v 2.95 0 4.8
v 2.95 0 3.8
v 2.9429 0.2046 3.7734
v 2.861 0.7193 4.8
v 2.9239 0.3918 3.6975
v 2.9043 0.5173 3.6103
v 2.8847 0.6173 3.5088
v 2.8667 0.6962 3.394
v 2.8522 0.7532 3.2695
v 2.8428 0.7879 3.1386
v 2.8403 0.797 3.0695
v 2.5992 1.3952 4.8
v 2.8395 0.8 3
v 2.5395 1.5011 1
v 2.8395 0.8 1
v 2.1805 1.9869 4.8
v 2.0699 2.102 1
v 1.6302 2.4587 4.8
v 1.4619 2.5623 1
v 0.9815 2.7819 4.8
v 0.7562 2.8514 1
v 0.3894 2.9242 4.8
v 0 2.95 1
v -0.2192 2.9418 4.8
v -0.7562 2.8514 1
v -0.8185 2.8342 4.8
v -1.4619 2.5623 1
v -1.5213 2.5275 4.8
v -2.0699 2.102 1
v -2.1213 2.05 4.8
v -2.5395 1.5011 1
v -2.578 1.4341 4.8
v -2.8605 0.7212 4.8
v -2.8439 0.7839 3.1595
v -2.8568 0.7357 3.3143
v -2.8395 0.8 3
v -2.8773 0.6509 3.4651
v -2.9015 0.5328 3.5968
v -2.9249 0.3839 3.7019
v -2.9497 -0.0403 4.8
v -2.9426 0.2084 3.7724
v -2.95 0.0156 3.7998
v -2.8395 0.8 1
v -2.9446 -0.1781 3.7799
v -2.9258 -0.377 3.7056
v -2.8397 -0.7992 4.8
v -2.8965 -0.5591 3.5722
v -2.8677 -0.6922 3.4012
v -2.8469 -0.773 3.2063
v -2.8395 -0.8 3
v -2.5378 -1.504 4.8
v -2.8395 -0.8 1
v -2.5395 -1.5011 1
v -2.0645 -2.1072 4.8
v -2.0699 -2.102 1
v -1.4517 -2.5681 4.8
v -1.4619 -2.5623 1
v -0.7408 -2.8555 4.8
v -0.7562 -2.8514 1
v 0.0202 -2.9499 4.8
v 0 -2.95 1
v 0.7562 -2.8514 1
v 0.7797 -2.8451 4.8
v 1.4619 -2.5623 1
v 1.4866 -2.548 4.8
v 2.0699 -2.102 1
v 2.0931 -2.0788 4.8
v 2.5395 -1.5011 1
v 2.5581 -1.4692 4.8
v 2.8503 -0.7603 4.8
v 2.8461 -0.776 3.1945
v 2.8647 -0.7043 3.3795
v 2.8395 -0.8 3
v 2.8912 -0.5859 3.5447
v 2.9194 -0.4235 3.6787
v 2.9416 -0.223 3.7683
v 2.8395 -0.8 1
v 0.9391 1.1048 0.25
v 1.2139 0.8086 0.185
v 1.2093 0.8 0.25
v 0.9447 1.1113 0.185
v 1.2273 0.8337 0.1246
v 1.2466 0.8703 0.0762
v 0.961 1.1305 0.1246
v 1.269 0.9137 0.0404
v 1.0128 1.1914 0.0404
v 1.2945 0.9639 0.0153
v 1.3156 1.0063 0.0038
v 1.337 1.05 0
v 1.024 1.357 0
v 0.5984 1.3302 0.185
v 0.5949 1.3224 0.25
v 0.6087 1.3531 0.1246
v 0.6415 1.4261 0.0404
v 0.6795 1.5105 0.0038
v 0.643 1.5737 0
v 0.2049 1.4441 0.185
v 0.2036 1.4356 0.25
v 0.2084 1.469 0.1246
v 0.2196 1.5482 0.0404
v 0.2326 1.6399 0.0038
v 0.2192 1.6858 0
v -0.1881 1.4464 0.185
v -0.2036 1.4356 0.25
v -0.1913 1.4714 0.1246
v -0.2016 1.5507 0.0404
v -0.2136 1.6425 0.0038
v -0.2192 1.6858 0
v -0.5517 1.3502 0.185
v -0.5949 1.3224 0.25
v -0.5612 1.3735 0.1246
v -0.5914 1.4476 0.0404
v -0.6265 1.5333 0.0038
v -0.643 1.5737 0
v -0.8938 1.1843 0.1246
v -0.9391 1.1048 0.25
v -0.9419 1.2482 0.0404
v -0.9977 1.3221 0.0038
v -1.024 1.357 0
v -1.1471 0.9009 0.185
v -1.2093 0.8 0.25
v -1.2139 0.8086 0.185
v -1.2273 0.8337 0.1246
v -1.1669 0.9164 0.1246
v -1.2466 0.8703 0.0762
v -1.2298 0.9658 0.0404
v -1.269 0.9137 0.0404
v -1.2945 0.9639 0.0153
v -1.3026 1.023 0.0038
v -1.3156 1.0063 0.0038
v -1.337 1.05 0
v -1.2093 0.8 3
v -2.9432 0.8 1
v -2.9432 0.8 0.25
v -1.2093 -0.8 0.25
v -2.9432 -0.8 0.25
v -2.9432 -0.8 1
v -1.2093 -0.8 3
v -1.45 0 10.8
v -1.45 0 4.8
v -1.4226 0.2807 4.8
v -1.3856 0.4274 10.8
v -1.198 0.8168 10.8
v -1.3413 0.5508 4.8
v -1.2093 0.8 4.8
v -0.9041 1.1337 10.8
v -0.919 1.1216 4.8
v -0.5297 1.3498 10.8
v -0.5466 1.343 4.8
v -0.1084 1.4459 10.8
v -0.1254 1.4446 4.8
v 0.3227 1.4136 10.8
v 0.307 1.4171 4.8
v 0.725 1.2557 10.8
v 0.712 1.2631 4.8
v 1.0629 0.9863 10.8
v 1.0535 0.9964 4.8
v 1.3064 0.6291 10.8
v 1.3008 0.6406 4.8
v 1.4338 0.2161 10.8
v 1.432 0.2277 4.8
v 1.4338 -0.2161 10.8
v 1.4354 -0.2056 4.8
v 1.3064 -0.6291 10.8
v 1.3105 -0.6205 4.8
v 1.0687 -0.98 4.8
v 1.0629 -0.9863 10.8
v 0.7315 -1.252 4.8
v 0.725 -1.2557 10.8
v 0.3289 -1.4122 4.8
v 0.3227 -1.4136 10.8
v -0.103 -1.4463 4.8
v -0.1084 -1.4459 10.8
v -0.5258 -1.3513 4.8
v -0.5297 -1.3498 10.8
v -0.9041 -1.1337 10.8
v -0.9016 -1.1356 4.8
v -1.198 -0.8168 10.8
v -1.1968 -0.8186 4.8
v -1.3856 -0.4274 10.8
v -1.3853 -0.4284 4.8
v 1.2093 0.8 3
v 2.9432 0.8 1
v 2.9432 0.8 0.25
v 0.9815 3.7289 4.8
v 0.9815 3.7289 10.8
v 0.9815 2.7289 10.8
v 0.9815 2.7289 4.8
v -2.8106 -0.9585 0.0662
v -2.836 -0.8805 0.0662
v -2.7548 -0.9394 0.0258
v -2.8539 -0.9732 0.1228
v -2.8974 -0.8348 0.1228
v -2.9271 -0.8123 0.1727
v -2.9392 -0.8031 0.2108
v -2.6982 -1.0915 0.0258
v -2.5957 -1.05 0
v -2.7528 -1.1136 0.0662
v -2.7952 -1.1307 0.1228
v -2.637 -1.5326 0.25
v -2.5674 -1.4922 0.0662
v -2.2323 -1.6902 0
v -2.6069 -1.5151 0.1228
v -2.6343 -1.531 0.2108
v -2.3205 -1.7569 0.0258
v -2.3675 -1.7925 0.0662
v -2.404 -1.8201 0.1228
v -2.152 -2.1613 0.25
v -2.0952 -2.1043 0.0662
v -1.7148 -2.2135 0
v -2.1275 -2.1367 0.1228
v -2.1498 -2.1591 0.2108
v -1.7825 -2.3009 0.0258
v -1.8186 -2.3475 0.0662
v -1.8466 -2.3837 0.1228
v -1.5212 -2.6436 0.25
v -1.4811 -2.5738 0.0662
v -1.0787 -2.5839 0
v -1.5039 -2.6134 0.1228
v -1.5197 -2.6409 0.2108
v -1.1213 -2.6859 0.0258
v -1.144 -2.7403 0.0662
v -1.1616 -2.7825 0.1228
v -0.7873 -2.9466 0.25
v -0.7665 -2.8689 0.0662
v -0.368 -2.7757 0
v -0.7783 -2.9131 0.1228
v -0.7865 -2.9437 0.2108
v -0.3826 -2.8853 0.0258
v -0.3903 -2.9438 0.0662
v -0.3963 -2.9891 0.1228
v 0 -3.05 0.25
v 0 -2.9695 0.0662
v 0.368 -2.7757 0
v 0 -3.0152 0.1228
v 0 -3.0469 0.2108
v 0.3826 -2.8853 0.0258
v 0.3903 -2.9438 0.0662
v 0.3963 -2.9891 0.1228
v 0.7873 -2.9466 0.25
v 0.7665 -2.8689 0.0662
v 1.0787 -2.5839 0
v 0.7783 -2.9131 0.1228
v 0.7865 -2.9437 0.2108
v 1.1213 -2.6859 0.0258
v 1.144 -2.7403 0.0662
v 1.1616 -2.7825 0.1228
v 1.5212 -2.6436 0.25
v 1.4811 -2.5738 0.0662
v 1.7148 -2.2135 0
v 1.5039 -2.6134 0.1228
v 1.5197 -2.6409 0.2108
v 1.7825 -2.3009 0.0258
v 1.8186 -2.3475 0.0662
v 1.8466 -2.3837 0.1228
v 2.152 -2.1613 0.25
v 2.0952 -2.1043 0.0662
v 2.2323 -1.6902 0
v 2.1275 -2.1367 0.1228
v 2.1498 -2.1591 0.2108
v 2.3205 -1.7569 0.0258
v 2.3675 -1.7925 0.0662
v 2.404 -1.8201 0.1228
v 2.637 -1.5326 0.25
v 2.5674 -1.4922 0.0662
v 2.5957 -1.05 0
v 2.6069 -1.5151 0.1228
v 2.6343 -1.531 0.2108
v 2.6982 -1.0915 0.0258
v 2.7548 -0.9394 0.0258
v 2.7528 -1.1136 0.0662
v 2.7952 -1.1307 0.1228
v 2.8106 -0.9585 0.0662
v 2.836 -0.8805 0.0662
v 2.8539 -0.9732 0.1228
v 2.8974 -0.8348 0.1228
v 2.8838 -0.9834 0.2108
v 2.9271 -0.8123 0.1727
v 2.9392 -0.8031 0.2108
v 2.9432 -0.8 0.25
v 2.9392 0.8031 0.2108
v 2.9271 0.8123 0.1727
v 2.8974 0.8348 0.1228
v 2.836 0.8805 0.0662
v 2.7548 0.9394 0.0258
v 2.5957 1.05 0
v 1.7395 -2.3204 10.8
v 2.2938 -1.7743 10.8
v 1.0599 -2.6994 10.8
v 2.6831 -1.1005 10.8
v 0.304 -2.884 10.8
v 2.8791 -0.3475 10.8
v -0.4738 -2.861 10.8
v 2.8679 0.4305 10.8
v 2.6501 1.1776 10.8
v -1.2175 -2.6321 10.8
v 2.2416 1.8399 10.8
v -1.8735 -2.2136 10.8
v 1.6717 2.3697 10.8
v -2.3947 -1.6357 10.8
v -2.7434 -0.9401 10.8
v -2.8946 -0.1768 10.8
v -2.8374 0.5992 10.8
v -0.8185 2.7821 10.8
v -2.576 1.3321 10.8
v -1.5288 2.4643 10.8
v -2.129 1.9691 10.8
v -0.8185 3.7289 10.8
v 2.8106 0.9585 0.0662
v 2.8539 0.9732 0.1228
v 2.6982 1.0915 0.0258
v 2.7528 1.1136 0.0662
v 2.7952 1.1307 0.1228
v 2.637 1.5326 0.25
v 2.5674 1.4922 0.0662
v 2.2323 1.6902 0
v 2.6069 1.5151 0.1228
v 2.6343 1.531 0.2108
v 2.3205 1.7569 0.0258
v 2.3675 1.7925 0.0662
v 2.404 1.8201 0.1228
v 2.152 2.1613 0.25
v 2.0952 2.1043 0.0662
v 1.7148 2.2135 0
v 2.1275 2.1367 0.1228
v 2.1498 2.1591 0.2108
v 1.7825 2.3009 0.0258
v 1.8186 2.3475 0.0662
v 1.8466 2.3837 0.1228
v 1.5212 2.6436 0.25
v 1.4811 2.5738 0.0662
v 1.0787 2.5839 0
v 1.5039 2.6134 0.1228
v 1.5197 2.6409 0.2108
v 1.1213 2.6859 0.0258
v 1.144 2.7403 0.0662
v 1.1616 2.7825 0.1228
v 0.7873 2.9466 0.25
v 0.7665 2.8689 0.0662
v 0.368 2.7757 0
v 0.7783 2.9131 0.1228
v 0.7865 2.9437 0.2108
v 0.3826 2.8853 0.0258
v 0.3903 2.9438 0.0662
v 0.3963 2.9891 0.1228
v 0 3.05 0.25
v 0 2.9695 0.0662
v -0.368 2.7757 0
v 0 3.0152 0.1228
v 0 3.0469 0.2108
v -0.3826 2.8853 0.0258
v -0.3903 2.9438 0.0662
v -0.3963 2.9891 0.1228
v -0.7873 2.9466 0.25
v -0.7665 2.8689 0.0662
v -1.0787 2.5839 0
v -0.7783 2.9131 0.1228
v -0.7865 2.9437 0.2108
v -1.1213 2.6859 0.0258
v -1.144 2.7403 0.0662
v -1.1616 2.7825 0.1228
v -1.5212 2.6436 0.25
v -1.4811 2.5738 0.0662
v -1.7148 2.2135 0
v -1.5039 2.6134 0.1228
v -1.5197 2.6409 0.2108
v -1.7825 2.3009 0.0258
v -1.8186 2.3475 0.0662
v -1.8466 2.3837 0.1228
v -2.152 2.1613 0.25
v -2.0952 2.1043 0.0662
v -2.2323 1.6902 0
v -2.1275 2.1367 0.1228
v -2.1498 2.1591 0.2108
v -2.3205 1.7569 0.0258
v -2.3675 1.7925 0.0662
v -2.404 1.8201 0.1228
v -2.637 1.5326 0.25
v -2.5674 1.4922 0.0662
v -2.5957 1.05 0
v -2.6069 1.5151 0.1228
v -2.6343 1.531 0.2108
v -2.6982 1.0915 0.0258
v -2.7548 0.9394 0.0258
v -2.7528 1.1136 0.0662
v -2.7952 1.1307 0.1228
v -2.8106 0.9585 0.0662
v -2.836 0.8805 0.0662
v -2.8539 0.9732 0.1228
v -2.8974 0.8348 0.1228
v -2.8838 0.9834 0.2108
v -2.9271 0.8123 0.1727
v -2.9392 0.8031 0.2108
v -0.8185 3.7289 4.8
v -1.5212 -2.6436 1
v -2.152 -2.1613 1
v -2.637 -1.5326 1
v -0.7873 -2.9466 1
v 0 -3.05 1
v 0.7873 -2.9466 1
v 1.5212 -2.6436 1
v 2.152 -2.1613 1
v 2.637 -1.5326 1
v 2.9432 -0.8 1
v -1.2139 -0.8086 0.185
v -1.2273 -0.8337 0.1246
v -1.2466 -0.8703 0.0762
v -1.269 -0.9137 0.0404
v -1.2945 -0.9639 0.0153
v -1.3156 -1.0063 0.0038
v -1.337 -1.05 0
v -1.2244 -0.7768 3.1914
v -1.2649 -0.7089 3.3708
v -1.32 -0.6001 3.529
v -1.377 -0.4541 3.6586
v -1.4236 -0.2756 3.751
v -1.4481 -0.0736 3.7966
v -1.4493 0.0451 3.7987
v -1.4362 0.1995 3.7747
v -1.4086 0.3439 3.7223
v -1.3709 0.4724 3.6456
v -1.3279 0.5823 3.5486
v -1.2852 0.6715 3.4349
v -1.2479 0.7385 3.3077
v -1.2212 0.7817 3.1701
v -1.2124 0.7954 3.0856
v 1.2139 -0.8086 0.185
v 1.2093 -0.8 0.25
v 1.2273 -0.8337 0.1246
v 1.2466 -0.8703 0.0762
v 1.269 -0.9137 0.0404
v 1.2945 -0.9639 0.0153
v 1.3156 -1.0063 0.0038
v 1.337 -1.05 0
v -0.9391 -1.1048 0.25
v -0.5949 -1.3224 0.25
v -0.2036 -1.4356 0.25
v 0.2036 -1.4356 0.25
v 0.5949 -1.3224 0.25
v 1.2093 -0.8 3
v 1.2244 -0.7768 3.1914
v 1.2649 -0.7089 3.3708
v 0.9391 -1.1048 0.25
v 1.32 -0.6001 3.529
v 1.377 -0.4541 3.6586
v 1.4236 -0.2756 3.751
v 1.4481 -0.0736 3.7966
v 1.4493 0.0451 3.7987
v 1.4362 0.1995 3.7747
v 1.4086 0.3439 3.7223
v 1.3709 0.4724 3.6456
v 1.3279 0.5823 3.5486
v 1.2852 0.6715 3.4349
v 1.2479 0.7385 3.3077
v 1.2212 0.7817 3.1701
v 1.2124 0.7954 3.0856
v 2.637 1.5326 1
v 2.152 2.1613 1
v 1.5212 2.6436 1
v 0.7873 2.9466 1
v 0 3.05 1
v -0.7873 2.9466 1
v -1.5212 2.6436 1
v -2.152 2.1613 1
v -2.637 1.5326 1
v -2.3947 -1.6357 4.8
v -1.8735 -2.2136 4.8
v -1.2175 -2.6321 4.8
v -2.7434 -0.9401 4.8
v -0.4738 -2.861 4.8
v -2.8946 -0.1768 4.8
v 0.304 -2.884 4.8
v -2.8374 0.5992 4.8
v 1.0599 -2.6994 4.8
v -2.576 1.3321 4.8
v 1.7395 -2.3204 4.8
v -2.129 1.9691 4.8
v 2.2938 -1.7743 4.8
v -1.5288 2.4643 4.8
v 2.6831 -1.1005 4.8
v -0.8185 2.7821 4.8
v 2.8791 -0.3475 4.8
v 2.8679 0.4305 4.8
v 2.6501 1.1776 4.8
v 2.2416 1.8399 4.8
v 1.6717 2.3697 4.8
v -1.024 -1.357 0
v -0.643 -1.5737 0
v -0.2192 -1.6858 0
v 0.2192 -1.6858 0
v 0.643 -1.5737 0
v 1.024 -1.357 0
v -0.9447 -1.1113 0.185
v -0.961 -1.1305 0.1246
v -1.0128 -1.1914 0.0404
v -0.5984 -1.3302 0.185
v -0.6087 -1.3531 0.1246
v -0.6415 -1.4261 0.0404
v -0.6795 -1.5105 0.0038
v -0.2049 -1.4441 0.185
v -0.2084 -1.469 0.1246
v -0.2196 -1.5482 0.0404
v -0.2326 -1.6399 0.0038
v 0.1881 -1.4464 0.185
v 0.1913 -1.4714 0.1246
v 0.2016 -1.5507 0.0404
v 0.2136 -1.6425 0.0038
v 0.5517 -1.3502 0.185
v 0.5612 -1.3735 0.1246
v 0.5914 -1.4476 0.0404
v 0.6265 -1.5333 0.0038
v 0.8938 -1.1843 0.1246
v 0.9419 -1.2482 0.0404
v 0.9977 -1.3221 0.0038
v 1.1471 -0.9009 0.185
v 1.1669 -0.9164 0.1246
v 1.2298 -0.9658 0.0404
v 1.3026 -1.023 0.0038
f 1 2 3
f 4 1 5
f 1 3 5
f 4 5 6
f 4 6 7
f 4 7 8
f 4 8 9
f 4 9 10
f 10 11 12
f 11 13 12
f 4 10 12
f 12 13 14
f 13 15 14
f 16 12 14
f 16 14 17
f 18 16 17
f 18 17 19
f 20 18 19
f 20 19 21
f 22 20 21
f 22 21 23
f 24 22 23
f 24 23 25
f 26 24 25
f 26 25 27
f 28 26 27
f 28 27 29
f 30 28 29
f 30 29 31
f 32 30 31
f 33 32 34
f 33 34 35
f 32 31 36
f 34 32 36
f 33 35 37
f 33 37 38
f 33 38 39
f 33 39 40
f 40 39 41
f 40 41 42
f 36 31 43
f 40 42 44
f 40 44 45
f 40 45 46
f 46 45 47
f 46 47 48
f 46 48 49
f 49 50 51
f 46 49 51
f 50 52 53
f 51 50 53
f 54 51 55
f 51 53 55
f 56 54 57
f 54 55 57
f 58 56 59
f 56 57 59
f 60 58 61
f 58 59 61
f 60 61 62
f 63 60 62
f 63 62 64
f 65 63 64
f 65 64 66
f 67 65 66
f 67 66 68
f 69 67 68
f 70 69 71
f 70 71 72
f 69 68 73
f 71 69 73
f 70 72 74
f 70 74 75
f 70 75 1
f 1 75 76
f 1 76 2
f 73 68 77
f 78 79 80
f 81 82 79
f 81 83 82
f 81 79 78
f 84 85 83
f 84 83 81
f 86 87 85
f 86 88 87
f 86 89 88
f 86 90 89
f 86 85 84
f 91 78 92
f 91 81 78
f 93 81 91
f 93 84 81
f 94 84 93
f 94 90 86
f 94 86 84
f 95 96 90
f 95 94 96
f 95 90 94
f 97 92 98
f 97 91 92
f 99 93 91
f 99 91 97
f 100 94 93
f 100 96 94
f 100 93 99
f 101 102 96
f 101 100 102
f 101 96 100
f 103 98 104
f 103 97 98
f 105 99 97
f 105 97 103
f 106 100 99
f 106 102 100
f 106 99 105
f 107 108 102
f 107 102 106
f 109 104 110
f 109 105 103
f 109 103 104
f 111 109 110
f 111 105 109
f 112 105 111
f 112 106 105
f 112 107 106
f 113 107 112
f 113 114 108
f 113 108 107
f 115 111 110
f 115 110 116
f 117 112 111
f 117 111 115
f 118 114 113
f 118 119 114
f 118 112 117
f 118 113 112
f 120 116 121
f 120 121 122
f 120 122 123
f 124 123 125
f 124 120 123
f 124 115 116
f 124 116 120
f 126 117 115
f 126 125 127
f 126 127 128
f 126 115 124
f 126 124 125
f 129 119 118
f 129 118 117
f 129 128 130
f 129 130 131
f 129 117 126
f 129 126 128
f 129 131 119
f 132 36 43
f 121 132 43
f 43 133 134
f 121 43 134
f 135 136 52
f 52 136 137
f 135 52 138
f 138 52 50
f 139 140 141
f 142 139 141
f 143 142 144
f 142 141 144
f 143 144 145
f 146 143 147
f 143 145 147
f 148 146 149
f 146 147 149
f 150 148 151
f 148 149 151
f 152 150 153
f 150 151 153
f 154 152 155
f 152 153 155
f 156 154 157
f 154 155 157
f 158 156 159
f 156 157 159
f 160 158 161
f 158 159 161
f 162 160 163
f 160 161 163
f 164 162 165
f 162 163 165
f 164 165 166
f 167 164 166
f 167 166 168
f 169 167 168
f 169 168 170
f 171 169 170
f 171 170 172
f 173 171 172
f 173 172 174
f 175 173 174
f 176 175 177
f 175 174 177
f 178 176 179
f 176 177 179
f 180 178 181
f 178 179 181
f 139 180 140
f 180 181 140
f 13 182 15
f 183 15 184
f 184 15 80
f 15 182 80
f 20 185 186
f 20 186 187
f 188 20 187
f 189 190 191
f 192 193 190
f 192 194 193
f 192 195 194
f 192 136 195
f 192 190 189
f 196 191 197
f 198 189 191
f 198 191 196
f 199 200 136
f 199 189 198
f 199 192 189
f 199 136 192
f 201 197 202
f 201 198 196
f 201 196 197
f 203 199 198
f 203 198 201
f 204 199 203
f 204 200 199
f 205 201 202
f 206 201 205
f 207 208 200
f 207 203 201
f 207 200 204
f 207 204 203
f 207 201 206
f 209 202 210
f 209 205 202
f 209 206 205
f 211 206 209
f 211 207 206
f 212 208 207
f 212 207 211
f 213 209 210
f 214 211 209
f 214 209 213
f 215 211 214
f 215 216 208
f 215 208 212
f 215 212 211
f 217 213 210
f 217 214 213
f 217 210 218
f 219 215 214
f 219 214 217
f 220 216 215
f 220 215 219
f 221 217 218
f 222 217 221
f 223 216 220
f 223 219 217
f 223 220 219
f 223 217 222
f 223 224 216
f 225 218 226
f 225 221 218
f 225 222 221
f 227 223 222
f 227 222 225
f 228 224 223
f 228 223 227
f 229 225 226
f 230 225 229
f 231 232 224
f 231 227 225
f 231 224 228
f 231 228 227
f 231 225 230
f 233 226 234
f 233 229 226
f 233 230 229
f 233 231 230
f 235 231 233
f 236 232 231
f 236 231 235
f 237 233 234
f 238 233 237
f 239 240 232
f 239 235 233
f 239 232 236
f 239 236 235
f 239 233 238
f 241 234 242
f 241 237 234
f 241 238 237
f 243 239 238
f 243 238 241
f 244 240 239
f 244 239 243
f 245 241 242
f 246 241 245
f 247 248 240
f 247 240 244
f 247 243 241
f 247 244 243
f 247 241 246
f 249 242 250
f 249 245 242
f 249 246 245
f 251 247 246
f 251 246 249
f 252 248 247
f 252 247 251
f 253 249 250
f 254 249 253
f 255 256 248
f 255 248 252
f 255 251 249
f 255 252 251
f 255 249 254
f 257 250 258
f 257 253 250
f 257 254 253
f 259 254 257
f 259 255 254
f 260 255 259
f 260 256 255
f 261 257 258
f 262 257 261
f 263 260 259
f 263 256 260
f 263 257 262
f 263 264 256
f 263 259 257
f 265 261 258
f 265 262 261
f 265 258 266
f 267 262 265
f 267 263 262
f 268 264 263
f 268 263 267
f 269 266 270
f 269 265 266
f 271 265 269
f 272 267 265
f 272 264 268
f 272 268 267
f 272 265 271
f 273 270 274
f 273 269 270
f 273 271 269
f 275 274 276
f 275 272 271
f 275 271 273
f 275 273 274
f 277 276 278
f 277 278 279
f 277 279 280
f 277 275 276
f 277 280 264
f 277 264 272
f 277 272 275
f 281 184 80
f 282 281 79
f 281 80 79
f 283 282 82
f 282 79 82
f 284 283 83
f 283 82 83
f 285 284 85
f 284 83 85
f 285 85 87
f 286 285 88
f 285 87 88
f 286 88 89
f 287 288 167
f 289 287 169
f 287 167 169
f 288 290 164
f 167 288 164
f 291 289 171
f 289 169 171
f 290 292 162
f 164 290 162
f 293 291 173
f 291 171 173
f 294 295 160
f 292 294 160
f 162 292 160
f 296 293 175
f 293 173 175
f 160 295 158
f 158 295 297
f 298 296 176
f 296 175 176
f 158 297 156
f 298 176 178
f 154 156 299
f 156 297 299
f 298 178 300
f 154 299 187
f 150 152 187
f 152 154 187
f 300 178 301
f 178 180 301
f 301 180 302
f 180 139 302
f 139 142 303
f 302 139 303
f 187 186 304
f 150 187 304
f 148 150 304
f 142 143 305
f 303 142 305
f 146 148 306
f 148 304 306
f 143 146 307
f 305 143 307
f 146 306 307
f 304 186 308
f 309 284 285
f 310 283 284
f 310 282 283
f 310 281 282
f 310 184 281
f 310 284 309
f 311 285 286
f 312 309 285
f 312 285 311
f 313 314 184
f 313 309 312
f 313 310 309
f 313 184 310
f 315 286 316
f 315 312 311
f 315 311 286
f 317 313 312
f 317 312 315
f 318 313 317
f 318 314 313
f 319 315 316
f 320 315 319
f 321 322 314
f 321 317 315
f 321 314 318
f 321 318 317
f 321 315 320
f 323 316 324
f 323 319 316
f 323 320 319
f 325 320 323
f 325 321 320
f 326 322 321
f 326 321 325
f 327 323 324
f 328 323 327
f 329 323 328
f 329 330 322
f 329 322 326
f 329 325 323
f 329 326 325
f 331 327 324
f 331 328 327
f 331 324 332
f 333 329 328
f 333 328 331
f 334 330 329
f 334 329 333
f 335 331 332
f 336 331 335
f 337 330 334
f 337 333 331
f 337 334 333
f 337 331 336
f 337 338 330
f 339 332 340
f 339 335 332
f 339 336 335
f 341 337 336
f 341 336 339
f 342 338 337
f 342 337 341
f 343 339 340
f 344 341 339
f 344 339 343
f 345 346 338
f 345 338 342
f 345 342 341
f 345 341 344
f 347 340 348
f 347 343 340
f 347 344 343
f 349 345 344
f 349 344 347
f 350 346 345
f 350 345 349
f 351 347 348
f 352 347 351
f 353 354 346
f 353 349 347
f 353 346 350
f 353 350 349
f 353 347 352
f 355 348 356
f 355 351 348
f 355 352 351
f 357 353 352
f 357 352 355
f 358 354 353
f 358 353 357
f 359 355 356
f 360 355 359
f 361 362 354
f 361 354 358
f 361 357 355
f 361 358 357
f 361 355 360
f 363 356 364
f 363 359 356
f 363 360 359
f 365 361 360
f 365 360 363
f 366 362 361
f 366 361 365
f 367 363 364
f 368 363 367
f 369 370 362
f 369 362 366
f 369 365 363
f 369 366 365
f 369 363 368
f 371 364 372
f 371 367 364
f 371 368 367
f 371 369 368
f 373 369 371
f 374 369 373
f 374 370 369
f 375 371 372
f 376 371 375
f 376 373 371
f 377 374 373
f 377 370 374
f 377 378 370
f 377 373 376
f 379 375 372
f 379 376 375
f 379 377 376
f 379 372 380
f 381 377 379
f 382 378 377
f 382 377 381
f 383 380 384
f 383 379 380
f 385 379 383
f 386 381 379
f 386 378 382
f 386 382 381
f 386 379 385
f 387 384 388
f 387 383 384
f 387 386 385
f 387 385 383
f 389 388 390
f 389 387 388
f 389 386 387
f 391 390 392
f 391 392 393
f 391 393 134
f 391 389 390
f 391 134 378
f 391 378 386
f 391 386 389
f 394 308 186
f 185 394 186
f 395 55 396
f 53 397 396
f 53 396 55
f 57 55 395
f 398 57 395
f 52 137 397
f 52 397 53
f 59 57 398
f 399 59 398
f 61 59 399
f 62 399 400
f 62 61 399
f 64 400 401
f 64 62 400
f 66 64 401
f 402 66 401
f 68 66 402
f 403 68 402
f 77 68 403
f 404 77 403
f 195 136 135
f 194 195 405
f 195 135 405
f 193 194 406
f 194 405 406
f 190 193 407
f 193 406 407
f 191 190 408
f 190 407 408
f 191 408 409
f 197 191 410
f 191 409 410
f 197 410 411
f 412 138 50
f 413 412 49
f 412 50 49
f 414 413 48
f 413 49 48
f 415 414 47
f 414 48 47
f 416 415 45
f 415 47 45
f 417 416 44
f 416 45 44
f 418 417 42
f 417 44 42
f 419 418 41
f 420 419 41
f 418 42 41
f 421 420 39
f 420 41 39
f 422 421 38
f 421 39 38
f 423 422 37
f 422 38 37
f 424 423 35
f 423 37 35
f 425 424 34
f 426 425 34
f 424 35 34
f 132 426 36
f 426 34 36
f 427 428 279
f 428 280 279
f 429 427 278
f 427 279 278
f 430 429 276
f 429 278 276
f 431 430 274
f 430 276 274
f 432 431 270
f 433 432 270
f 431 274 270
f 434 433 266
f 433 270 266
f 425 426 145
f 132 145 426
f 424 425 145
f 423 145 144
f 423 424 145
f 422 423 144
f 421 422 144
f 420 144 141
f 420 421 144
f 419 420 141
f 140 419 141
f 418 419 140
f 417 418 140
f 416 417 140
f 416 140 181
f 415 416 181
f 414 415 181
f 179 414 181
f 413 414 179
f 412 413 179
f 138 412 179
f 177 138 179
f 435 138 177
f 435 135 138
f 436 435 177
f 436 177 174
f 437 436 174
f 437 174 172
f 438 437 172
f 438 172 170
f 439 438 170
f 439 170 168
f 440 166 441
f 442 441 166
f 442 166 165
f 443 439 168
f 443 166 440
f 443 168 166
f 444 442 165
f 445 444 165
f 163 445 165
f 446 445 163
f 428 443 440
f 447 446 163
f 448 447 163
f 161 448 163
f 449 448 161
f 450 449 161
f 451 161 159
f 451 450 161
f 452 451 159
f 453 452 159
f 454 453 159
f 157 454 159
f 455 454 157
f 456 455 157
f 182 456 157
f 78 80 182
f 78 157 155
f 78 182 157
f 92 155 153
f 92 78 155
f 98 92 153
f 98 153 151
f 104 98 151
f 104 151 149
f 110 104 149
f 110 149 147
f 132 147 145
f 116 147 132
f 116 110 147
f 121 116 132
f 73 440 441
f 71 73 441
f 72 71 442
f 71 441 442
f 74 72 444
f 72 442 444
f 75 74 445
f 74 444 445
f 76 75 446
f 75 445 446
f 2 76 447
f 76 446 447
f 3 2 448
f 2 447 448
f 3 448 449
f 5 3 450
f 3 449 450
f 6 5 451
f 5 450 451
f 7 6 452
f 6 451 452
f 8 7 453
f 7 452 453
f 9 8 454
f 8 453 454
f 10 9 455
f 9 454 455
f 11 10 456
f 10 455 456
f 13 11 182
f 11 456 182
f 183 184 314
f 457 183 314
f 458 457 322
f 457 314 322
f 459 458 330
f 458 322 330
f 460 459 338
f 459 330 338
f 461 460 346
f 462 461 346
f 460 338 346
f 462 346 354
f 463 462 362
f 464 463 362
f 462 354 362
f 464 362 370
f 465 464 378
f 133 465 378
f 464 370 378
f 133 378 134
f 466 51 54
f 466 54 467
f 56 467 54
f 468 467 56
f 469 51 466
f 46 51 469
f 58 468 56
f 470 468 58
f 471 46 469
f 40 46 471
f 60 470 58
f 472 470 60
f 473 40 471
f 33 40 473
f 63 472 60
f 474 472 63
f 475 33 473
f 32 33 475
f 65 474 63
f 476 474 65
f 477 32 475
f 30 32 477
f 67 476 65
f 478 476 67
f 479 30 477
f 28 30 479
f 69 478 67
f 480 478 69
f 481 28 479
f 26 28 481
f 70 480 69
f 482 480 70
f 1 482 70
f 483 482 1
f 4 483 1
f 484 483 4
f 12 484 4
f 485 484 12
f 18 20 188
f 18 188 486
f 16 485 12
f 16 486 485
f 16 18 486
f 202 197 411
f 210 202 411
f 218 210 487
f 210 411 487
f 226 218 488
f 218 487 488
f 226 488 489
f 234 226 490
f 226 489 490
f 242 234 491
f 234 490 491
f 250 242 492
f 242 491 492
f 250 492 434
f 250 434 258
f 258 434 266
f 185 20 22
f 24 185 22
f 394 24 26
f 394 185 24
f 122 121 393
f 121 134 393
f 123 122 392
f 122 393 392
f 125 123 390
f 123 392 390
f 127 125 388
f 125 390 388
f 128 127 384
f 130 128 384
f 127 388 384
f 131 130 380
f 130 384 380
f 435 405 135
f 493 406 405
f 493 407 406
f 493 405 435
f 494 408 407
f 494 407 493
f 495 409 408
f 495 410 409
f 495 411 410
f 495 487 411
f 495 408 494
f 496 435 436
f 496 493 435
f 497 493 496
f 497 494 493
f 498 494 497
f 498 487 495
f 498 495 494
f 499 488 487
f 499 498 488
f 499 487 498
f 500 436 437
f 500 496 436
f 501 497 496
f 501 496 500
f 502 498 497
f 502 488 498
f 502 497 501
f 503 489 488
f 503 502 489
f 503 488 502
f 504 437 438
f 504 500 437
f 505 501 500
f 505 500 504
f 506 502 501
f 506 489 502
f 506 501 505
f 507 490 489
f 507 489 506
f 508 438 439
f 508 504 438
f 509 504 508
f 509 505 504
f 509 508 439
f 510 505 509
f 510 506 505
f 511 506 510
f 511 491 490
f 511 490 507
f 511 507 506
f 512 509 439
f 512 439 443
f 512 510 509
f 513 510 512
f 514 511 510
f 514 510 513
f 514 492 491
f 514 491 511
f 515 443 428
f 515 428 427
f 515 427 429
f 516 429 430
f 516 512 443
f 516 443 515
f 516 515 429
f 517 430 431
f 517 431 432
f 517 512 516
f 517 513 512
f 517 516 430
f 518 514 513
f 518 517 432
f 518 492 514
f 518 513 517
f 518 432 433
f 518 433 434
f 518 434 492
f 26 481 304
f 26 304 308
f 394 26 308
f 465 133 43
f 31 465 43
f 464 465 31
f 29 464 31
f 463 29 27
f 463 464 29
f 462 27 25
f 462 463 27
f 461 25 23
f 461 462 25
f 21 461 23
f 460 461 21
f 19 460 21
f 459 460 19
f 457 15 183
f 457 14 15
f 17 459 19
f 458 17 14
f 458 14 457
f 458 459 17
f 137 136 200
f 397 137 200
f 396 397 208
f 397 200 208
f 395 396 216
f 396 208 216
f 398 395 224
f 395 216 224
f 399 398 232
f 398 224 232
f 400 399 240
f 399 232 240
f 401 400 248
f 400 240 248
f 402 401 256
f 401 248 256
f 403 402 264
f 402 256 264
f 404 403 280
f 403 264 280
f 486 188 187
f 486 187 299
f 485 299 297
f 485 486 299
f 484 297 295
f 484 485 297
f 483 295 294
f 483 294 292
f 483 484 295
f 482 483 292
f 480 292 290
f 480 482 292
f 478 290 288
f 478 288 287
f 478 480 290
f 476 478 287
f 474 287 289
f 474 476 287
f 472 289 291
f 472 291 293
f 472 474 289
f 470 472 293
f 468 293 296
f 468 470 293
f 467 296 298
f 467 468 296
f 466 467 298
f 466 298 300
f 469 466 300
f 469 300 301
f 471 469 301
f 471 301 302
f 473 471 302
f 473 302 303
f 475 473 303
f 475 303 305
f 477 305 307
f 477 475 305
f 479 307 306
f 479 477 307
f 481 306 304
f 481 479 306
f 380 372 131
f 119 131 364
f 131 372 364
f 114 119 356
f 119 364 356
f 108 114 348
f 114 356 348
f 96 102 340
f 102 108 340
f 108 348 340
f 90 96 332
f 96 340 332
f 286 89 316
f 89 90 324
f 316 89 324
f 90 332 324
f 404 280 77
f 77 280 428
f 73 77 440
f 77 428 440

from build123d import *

# Parameters (mm, degrees)
SKETCH1_R               = 2.95
BOSS_EXTRUDE1_DEPTH     = 4.8
SKETCH10_R              = 3.05
BOSS_EXTRUDE2_DEPTH     = 1
CUT_EXTRUDE2_DEPTH      = 7.453293733
CUT_EXTRUDE2_DEPTH_BACK = 7.453293733
SKETCH1_4_R             = 1.45
CUT_EXTRUDE1_DEPTH      = 9
BOSS_EXTRUDE3_DEPTH     = 6
SKETCH12_R              = 1.45
CUT_EXTRUDE3_DEPTH      = 8.655520086
FILLET2_R               = 0.25


with BuildPart() as part:
    # Sketch1 → Boss-Extrude1 (new body)
    with BuildSketch(Plane(origin=(0, 0, 0), x_dir=(0, 1, 0), z_dir=(0, 0, 1))):
        with Locations(Location((0, 0, 0), (0, 0, 270))):
            Circle(SKETCH1_R)
    extrude(amount=BOSS_EXTRUDE1_DEPTH)

    # Sketch10 → Boss-Extrude2 (add)
    with BuildSketch(Plane(origin=(0, 0, 0), x_dir=(0, 1, 0), z_dir=(0, 0, 1))):
        with Locations(Location((0, 0, 0), (0, 0, 270))):
            Circle(SKETCH10_R)
    extrude(amount=BOSS_EXTRUDE2_DEPTH)

    # Sketch3 → Cut-Extrude2 (cut, two sides: drawn at the far end of the back side and taken through both)
    with BuildSketch(Plane.YZ.offset(-CUT_EXTRUDE2_DEPTH_BACK)):
        with BuildLine():
            Line((-0.8, -0.344662329), (-0.8, 3))
            ThreePointArc((-0.8, 3), (0, 3.8), (0.8, 3))
            Line((0.8, 3), (0.8, -0.344662329))
            ThreePointArc((0.8, -0.344662329), (0, -1.144662329), (-0.8, -0.344662329))
        make_face()
    extrude(amount=CUT_EXTRUDE2_DEPTH + CUT_EXTRUDE2_DEPTH_BACK, mode=Mode.SUBTRACT)

    # Sketch1<4> → Cut-Extrude1 (cut)
    with BuildSketch(Plane(origin=(0, 0, 0), x_dir=(0, 1, 0), z_dir=(0, 0, 1))):
        with Locations(Location((0, 0, 0), (0, 0, 56.514623377))):
            Circle(SKETCH1_4_R)
    extrude(amount=CUT_EXTRUDE1_DEPTH, mode=Mode.SUBTRACT)

    # Sketch11 → Boss-Extrude3 (add)
    with BuildSketch(Plane.XY.offset(4.8)):
        with BuildLine():
            Line((-0.818543418, 3.728872107), (0.981456582, 3.728872107))
            Line((0.981456582, 3.728872107), (0.981456582, 2.728872107))
            ThreePointArc((0.981456582, 2.728872107), (-0.085691473, -2.898733684), (-0.818543418, 2.782083153))
            Line((-0.818543418, 2.782083153), (-0.818543418, 3.728872107))
        make_face()
    extrude(amount=BOSS_EXTRUDE3_DEPTH)

    # Sketch12 → Cut-Extrude3 (cut, through all)
    with BuildSketch(Plane(origin=(0, 0, 4.8), x_dir=(1, 0, 0), z_dir=(0, 0, -1))):
        with Locations(Location((0, 0, 0), (0, 0, 180))):
            Circle(SKETCH12_R)
    extrude(amount=-CUT_EXTRUDE3_DEPTH, mode=Mode.SUBTRACT)

    # Fillet2
    fillet2_edges = [part.edges().sort_by_distance(p)[0] for p in [
        (0, 3.05, 0),
        (0, -3.05, 0),
        (2.076275596, 0.8, 0),
        (-2.076275596, -0.8, 0),
        (-2.076275596, 0.8, 0),
        (2.076275596, -0.8, 0),
        (0, 1.45, 0),
        (0, -1.45, 0),
    ]]
    fillet(fillet2_edges, radius=FILLET2_R)


solid = part.part
